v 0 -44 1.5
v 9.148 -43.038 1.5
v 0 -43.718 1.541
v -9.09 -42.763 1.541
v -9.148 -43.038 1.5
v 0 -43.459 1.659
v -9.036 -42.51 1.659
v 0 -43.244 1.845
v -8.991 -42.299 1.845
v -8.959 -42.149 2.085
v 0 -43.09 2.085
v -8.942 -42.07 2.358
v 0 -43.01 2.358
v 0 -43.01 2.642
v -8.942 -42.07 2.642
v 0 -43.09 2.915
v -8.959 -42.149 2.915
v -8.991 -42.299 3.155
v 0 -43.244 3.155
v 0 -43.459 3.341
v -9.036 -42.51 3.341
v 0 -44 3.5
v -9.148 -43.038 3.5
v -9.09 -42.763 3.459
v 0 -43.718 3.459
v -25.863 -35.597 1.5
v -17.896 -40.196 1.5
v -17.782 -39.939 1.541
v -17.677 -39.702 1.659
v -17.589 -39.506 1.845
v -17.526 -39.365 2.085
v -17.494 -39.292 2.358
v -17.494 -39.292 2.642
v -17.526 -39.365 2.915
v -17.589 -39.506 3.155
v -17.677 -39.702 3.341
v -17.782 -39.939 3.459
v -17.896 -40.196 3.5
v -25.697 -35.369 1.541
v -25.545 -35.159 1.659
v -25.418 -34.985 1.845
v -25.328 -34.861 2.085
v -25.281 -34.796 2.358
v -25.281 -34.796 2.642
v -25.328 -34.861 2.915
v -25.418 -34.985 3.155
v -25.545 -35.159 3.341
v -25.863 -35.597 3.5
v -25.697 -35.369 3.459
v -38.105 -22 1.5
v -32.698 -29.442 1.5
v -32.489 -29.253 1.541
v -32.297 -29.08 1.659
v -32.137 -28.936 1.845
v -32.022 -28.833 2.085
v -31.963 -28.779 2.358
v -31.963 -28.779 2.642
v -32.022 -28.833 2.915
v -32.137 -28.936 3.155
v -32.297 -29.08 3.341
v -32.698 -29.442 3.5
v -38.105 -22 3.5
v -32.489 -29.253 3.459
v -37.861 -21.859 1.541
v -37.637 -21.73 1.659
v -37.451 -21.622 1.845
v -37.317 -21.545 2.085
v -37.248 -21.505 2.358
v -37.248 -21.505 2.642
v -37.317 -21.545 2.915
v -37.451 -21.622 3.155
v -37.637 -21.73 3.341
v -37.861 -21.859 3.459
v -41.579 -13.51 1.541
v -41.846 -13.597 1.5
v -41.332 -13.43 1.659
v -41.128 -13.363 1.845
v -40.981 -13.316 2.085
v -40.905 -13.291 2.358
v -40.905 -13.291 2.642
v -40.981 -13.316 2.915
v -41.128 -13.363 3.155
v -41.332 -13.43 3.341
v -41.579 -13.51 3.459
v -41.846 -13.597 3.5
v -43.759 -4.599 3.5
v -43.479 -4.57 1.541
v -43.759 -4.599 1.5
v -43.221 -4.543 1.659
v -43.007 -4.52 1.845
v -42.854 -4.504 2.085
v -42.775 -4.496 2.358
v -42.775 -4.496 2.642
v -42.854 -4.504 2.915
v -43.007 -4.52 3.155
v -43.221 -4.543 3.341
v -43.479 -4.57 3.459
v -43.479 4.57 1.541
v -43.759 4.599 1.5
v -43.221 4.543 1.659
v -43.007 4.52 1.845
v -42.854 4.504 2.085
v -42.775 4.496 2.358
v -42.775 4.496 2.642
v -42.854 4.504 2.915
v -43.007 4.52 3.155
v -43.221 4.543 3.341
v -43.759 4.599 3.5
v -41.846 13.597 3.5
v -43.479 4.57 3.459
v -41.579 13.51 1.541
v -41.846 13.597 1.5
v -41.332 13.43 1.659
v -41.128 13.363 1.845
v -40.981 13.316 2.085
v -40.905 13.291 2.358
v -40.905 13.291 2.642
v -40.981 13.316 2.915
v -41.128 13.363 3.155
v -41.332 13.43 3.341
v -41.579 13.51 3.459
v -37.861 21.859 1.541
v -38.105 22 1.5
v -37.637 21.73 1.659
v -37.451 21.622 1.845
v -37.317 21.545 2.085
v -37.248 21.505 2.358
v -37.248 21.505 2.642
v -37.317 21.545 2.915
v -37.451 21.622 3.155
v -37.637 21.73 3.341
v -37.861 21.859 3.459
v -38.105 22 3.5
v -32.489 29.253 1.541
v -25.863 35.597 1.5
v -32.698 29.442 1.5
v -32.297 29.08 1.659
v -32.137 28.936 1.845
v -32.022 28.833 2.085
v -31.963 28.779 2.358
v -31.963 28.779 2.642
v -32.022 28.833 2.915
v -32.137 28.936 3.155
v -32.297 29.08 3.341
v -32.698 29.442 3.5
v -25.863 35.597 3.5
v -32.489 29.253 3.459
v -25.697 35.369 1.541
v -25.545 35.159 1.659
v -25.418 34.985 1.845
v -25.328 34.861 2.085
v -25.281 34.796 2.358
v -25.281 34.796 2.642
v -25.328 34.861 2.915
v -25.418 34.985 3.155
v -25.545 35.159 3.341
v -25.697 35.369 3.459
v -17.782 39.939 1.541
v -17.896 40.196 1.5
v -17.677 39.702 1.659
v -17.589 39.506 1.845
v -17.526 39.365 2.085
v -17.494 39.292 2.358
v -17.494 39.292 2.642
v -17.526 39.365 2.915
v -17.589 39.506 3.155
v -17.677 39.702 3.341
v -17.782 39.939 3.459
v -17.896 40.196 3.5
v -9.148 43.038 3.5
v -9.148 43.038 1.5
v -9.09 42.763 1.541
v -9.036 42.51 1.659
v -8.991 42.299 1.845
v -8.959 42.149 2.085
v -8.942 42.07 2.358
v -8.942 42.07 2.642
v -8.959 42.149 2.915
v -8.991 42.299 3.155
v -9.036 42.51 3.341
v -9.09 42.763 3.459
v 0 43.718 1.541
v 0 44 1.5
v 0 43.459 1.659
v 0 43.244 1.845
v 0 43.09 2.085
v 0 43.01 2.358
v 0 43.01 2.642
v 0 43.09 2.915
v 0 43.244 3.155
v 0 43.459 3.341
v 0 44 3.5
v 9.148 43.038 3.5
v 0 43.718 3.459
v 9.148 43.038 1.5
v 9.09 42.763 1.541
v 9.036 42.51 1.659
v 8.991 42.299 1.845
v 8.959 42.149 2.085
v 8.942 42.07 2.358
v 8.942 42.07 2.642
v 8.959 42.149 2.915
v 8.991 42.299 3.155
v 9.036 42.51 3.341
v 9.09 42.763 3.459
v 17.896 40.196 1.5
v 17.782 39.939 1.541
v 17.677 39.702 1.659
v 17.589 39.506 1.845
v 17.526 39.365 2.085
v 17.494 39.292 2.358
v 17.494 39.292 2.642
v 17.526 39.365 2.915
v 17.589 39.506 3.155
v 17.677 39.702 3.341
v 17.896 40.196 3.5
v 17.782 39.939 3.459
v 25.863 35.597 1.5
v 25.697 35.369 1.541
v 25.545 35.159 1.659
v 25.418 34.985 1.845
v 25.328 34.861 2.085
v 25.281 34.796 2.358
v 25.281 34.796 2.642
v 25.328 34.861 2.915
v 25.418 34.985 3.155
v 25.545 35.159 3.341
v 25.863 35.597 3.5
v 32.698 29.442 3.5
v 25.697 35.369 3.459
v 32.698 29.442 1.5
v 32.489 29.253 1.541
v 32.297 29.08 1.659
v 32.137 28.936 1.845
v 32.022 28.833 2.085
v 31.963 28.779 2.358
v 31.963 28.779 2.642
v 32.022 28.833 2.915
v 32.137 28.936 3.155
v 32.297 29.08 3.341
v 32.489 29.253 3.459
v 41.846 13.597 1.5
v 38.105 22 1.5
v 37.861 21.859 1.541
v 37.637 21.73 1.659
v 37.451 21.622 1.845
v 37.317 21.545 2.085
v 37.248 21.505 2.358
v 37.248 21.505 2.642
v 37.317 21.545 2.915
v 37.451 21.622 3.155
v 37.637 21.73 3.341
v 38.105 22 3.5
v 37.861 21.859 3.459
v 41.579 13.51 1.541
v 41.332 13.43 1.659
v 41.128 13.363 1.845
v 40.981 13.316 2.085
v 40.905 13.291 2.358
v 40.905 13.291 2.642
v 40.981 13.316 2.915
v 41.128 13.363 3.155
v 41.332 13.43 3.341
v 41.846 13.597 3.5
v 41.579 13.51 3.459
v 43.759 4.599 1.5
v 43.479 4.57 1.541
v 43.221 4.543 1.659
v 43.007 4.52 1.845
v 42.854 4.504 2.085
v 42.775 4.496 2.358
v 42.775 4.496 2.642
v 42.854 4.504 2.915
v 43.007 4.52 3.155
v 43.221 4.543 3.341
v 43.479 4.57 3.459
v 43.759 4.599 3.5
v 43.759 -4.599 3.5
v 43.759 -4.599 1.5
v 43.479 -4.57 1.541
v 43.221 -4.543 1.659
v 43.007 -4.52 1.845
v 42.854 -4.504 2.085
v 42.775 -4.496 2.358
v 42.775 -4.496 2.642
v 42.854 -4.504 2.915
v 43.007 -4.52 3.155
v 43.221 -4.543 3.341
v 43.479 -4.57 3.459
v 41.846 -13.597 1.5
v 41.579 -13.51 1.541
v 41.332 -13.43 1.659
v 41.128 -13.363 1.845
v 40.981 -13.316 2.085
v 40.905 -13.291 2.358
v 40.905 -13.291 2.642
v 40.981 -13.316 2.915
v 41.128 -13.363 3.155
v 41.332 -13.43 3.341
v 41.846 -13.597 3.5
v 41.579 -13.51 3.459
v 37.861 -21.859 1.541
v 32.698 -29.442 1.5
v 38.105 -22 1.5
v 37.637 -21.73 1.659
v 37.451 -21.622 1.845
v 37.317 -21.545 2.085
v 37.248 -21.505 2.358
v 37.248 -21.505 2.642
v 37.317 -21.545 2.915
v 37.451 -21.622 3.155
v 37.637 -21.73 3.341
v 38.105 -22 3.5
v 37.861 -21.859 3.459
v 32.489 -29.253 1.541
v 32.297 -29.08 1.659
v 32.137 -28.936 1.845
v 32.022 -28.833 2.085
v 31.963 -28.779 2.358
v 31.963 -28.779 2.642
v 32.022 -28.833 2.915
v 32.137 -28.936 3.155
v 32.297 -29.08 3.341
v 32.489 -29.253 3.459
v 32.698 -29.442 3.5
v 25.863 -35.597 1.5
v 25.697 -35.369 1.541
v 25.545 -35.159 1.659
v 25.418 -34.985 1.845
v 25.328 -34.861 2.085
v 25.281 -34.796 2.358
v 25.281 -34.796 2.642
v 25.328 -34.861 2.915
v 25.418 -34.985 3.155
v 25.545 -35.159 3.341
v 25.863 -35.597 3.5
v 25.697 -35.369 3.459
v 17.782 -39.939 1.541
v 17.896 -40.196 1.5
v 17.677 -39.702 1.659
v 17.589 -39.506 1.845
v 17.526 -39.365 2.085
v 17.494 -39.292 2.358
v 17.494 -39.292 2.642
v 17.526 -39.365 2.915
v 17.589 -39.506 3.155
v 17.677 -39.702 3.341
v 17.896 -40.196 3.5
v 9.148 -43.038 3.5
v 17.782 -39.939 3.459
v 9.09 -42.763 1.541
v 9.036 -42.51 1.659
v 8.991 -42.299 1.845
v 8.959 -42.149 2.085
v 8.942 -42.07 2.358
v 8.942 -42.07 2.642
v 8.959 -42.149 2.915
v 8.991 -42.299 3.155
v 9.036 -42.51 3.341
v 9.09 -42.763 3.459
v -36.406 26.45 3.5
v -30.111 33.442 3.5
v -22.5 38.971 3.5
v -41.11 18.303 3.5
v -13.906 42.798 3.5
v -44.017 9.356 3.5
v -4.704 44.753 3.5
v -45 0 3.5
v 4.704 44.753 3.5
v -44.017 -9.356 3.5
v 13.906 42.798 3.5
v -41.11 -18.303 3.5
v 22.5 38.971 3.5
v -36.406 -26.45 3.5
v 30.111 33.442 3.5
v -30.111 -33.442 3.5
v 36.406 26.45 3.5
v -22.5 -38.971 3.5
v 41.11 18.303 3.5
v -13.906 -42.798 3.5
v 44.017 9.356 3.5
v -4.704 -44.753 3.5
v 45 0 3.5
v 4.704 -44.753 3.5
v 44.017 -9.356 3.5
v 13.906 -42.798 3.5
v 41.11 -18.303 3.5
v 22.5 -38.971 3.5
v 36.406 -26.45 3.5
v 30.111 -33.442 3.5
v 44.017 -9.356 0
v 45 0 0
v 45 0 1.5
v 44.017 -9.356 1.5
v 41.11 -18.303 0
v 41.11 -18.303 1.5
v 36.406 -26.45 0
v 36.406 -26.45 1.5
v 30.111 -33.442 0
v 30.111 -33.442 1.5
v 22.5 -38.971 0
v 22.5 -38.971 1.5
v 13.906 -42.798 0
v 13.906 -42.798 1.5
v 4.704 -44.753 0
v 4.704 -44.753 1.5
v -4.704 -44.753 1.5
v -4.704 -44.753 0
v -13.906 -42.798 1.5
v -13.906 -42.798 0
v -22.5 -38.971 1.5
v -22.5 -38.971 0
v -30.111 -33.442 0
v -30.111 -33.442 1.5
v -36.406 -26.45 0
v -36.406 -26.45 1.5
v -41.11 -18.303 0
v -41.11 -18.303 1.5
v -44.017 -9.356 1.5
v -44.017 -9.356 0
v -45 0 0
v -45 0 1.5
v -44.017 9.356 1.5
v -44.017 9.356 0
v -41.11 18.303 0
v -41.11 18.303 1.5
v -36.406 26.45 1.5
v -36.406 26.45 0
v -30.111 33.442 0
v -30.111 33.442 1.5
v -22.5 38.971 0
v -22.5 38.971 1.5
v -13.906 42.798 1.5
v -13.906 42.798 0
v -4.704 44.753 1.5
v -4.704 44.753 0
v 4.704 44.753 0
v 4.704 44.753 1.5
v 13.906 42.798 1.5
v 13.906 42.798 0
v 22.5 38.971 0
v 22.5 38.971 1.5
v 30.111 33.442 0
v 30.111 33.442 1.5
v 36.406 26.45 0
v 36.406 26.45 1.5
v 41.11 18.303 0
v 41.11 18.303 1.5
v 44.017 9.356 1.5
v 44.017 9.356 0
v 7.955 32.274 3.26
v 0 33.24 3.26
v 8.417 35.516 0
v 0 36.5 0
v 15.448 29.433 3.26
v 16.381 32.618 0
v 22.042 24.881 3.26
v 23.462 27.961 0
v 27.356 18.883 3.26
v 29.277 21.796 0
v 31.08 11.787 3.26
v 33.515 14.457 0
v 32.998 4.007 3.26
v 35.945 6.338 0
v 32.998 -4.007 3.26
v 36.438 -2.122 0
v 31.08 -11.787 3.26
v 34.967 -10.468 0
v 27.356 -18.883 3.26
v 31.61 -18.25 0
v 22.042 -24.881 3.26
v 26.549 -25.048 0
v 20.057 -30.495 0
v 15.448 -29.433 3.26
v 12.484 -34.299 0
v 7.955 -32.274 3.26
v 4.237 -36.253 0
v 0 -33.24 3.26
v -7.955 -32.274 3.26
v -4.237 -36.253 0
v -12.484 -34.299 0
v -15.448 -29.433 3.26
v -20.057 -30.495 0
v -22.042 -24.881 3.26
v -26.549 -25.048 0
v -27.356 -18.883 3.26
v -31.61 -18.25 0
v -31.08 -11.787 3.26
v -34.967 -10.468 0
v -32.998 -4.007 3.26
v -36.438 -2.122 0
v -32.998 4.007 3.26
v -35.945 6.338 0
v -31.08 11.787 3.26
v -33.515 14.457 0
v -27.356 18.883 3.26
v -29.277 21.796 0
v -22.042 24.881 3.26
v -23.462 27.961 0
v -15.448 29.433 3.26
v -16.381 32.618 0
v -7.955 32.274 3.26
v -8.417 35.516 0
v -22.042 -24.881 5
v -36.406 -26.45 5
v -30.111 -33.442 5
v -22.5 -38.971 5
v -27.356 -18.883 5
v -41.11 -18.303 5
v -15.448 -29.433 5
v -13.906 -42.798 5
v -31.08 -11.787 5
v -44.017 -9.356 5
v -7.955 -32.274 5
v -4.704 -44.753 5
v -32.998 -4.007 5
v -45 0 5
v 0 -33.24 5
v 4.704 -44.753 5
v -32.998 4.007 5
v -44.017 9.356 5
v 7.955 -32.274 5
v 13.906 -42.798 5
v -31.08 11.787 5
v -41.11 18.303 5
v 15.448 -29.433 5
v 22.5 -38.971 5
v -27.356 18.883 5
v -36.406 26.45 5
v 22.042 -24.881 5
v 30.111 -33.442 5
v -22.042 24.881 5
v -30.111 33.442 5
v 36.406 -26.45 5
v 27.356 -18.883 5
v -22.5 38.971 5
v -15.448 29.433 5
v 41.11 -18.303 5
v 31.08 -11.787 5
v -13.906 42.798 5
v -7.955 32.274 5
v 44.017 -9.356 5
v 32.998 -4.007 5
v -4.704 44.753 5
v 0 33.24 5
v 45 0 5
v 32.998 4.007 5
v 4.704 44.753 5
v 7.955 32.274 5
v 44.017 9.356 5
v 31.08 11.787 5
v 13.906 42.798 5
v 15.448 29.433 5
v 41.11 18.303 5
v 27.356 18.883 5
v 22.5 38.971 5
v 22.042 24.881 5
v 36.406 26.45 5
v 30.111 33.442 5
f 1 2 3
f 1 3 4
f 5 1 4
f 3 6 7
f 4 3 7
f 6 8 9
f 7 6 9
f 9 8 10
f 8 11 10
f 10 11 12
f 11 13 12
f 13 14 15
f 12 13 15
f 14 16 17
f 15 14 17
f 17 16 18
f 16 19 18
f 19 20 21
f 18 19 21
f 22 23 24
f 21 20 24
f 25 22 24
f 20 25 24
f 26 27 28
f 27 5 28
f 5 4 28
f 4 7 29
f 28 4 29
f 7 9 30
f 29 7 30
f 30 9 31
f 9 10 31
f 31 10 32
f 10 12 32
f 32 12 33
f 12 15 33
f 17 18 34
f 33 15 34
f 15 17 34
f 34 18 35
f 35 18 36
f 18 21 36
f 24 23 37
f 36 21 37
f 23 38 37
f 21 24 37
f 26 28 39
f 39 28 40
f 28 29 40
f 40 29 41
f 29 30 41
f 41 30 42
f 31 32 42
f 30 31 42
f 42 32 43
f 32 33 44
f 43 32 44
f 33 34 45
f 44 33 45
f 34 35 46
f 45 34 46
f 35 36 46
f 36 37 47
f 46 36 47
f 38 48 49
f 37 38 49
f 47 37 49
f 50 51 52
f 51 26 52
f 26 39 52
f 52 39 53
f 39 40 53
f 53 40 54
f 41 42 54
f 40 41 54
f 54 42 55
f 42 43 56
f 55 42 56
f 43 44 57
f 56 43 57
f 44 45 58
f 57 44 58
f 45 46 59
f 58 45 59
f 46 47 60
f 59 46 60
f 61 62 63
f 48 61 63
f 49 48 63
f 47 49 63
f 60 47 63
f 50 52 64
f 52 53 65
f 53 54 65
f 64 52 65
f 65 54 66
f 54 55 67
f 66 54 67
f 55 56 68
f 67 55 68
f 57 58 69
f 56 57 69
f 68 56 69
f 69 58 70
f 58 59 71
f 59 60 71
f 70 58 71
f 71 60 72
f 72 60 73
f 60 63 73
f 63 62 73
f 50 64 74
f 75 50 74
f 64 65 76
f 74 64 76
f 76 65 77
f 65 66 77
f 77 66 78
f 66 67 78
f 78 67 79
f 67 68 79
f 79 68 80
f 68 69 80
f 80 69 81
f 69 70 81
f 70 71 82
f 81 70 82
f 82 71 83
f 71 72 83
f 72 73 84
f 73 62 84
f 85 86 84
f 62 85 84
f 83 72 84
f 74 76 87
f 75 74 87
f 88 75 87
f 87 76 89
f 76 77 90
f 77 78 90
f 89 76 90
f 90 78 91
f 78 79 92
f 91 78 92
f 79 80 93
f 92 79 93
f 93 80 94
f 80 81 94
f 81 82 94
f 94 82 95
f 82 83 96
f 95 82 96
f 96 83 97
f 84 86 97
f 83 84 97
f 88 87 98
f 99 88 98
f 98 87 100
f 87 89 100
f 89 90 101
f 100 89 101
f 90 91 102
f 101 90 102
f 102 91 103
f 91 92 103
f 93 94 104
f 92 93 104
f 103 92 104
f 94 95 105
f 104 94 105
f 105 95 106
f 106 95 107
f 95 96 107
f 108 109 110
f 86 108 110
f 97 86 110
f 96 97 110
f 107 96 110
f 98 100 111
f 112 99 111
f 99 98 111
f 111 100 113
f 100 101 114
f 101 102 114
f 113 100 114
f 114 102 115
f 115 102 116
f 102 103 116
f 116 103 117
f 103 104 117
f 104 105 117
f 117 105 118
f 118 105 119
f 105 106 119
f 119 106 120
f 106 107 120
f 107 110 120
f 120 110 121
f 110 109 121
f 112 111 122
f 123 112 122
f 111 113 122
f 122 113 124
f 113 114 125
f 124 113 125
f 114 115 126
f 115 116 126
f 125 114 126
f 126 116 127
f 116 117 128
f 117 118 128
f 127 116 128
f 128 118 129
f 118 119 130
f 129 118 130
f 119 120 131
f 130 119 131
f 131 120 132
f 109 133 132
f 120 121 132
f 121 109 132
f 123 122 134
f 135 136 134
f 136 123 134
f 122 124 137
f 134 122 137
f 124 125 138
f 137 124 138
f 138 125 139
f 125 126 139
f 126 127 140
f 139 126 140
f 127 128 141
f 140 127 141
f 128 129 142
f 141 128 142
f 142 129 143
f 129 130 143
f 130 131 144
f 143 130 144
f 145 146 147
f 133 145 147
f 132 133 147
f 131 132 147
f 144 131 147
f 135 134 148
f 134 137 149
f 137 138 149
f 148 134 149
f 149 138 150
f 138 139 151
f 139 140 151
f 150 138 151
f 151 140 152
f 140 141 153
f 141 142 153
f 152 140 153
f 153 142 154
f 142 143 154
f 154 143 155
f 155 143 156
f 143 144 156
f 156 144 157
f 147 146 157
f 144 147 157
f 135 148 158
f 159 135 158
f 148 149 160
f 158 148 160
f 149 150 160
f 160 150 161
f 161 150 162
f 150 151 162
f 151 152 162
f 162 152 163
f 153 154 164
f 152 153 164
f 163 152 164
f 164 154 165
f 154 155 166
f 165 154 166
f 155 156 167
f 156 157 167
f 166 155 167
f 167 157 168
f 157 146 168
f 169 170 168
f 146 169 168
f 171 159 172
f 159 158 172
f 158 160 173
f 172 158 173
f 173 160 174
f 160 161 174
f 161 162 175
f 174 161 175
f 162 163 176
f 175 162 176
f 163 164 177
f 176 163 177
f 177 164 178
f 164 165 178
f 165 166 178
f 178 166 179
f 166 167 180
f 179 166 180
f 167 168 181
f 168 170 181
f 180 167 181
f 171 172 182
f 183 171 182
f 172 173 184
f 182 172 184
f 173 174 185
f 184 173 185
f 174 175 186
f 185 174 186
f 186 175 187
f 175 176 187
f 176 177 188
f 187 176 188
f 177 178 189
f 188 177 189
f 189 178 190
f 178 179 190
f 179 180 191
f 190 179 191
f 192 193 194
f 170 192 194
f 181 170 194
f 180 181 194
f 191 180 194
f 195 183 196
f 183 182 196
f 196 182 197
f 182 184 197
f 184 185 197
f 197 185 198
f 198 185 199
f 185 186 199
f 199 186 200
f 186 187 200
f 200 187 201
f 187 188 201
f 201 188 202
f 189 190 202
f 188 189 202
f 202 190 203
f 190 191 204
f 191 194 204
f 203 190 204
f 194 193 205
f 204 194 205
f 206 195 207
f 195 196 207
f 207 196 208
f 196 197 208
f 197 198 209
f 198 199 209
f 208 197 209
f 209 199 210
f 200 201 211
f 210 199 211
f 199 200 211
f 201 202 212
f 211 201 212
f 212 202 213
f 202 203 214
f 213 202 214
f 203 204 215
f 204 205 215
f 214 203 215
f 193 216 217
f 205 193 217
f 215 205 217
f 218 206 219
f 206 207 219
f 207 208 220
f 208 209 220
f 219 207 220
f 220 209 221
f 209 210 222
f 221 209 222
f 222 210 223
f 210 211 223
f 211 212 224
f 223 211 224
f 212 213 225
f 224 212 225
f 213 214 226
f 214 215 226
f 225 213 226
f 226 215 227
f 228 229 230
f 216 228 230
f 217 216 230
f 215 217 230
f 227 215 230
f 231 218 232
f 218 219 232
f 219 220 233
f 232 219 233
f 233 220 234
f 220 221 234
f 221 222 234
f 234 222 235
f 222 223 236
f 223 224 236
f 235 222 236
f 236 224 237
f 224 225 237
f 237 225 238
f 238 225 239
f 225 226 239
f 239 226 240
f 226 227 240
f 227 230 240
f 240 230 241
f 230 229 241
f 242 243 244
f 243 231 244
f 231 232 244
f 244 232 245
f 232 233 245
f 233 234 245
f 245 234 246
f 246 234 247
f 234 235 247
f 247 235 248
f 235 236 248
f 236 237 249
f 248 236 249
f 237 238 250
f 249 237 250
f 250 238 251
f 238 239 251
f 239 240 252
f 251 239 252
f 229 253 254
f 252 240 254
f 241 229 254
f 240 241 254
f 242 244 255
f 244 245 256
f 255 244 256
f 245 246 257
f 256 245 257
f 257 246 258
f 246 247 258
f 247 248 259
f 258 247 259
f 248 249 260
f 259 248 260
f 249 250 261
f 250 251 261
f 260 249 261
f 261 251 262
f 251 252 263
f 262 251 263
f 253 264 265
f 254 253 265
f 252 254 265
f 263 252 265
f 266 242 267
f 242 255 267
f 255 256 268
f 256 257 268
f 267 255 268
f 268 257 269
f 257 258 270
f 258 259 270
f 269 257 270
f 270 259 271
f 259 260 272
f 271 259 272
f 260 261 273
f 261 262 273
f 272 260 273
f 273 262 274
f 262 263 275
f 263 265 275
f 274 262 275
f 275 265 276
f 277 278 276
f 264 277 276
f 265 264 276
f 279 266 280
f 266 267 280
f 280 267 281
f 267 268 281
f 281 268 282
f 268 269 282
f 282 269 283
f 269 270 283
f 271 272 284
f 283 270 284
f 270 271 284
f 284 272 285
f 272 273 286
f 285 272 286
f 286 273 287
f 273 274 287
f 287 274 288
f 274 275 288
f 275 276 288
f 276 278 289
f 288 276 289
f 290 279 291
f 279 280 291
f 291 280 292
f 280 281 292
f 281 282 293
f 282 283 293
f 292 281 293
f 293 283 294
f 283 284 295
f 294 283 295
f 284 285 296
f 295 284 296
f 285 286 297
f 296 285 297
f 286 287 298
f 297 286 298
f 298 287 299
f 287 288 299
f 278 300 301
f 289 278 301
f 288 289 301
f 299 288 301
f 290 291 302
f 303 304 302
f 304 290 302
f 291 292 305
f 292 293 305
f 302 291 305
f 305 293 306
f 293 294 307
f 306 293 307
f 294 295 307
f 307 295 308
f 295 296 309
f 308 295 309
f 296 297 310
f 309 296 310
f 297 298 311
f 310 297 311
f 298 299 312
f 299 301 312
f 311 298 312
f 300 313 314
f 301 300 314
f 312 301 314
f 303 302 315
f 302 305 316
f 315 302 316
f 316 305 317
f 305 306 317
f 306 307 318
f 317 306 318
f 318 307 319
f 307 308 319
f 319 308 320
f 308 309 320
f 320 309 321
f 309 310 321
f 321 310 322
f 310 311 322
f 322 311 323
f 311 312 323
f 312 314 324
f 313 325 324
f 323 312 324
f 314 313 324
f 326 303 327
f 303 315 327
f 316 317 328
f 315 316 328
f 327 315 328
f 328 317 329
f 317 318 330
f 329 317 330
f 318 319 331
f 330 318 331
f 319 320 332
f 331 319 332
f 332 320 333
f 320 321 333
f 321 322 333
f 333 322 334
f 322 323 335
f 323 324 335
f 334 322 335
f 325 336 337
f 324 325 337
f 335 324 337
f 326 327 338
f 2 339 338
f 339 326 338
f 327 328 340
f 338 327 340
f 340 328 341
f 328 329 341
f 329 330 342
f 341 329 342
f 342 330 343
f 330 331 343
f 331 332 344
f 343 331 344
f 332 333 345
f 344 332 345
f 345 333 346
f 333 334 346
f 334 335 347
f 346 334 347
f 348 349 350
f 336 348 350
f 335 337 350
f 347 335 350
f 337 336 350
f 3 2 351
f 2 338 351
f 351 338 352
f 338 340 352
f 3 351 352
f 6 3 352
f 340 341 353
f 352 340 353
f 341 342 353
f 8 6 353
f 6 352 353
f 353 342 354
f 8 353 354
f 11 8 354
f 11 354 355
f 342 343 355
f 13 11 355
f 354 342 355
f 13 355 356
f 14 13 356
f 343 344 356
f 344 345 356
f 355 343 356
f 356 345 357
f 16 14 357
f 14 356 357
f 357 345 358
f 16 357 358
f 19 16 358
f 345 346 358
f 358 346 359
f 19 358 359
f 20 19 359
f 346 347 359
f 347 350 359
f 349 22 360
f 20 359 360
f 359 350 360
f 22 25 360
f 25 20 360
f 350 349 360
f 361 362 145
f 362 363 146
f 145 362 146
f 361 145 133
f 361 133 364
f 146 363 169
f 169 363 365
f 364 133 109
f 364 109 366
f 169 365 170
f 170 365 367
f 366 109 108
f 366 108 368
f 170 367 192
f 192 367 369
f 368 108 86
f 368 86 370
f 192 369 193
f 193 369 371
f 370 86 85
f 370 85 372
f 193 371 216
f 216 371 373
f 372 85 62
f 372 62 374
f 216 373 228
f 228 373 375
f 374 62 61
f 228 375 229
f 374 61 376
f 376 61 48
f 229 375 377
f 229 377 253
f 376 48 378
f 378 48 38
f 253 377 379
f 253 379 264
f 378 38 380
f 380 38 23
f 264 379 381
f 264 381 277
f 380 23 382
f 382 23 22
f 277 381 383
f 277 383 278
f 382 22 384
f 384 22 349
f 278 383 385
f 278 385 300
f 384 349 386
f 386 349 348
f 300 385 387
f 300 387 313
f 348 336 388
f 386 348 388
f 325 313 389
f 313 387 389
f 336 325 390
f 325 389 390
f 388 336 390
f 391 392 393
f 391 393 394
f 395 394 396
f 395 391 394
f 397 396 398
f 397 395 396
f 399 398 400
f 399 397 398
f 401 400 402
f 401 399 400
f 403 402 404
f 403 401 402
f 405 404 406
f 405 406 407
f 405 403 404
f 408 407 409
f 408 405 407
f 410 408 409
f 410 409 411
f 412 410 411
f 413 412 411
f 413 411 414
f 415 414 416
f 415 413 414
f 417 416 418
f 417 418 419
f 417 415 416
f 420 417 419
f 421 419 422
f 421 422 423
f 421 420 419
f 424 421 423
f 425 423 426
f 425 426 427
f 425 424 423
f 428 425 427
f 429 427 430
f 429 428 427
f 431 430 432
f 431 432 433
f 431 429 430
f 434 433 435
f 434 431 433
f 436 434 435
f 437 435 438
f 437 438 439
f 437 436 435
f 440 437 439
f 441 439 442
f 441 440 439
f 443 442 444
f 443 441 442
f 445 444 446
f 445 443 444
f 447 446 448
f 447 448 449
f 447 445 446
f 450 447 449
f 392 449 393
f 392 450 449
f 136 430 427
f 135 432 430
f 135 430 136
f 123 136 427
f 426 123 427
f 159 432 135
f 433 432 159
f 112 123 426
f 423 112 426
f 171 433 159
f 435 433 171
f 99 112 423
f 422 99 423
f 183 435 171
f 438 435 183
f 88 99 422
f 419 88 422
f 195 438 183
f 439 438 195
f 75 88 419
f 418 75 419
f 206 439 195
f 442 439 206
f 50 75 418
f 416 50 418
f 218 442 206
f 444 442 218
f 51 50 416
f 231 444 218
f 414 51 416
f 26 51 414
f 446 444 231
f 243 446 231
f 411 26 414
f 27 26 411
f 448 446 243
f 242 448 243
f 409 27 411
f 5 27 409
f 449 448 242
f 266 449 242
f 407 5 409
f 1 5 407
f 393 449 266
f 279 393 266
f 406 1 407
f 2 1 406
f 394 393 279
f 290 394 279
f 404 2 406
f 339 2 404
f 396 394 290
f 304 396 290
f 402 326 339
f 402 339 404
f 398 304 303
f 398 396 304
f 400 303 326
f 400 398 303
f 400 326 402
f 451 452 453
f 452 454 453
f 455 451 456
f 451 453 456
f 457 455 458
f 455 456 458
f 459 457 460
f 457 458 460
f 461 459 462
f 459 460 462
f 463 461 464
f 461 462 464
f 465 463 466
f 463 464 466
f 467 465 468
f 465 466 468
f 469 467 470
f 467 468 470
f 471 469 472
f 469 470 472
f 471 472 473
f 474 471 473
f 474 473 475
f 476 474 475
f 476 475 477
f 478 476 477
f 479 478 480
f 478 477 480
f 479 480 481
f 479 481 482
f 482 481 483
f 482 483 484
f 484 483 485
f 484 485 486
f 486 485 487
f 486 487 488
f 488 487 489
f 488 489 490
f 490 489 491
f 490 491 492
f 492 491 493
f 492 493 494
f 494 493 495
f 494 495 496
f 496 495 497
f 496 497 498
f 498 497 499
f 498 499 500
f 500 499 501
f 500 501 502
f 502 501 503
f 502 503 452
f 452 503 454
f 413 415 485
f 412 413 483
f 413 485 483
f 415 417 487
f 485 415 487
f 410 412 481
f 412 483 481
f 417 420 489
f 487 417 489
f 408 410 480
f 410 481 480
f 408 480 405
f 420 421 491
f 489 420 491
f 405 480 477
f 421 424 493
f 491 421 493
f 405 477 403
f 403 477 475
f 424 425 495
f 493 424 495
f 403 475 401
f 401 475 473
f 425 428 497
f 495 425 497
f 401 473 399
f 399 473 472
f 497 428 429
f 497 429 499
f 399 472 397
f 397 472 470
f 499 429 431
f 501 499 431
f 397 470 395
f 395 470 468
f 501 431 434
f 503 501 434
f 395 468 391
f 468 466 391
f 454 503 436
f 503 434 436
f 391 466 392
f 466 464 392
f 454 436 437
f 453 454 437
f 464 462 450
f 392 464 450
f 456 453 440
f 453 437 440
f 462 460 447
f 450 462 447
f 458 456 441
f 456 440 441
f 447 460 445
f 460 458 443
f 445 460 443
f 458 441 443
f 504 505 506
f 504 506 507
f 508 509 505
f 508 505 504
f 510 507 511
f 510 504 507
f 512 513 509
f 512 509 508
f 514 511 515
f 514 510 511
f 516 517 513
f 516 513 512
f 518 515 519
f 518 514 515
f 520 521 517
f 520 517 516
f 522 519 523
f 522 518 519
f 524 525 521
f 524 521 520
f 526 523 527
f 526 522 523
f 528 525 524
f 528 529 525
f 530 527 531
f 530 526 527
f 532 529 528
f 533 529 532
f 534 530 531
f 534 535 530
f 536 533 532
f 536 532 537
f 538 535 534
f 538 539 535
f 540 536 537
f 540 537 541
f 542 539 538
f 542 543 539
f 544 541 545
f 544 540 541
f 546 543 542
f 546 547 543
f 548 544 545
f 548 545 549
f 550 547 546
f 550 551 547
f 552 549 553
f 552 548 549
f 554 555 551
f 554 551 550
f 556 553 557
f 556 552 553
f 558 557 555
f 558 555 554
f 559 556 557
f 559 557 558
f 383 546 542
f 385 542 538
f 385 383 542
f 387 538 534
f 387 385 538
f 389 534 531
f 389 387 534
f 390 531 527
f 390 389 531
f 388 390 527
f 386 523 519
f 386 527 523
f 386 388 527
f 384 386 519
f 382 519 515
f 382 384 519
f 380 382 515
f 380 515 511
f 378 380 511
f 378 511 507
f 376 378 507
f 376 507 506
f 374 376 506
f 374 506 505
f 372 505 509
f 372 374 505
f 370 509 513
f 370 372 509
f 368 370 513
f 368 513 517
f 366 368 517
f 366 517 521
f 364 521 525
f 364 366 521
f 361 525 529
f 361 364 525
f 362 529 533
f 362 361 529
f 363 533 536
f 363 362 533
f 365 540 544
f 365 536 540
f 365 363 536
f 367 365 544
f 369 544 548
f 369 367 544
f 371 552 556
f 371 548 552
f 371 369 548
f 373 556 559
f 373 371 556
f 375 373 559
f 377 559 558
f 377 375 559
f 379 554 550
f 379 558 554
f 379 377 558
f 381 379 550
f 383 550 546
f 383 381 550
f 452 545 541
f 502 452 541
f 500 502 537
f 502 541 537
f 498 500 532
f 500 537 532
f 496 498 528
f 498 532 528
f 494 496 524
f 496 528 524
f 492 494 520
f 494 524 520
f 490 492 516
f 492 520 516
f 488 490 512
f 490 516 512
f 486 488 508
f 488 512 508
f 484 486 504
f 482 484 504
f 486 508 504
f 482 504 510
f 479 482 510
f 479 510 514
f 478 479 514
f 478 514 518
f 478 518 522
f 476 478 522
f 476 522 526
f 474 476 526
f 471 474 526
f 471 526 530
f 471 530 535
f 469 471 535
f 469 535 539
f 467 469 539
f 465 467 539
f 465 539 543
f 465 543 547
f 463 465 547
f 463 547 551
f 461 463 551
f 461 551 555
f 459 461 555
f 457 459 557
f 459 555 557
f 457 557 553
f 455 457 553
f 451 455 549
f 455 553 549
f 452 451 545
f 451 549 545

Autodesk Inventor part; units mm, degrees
ref_plane "YZ Plane" through (0, 0, 0) normal (1, 0, 0) x (0, 1, 0)
ref_plane "XZ Plane" through (0, 0, 0) normal (0, 1, 0) x (-1, 0, 0)
ref_plane "XY Plane" through (0, 0, 0) normal (0, 0, 1) x (1, 0, 0)
sketch "Эскиз1" plane through (0, 0, 0) normal (0, 0, 1) x (1, 0, 0)
  circle A0 centre (0, 0) radius 30
  circle A1 centre (0, 0) radius 45
  dimension "d0" = 60
  dimension "d1" = 90
extrude "Выдавливание1" add sketch "Эскиз1" along normal blind 5
sketch "Эскиз2" plane through (0, 0, 0) normal (1, 0, 0) x (0, 1, 0)
  line L0 (-45, 0) -> (-45, 5) projected
  line L1 (0, -0.8) -> (0, 4.8) projected
  line L2 (-45, 0) -> (-45, 5) projected
  line L3 (-45, 2.5) -> (-44, 2.5)
  circle A0 centre (-44, 2.5) radius 1
  line L4 (-44, 3.5) -> (-45, 3.5)
  line L5 (-44, 1.5) -> (-45, 1.5)
  line L6 (-45, 0) -> (-45, 5) projected
  point P0 (0, 0)
  dimension "d6" = 1
  dimension "d7" = 2
revolve "Вращение1" cut sketch "Эскиз2" angle 360 about axis through (0, 0, -10) along (0, 0, 1)
sketch "Эскиз3" plane through (0, 0, 0) normal (1, 0, 0) x (0, 1, 0)
  line L0 (45, 0) -> (-45, 0) projected
  line L1 (0, -4) -> (0, 6.5) projected
  line L2 (33.2404, 3.2596) -> (36.5, 0)
  line L3 (45, 5) -> (-45, 5) projected
  line L4 (33.2404, 3.2596) -> (33.2404, 5)
  line L5 (30, 5) -> (30, 0) projected
  point P0 (0, 0)
  dimension "d13" = 45
revolve "Вращение2" cut sketch "Эскиз3" angle 360 about axis through (0, 0, -10) along (0, 0, 1) contours L0 L5 L3 L4 L2
properties part number "Кольцо сальника 2" material "Сталь, легированная"
